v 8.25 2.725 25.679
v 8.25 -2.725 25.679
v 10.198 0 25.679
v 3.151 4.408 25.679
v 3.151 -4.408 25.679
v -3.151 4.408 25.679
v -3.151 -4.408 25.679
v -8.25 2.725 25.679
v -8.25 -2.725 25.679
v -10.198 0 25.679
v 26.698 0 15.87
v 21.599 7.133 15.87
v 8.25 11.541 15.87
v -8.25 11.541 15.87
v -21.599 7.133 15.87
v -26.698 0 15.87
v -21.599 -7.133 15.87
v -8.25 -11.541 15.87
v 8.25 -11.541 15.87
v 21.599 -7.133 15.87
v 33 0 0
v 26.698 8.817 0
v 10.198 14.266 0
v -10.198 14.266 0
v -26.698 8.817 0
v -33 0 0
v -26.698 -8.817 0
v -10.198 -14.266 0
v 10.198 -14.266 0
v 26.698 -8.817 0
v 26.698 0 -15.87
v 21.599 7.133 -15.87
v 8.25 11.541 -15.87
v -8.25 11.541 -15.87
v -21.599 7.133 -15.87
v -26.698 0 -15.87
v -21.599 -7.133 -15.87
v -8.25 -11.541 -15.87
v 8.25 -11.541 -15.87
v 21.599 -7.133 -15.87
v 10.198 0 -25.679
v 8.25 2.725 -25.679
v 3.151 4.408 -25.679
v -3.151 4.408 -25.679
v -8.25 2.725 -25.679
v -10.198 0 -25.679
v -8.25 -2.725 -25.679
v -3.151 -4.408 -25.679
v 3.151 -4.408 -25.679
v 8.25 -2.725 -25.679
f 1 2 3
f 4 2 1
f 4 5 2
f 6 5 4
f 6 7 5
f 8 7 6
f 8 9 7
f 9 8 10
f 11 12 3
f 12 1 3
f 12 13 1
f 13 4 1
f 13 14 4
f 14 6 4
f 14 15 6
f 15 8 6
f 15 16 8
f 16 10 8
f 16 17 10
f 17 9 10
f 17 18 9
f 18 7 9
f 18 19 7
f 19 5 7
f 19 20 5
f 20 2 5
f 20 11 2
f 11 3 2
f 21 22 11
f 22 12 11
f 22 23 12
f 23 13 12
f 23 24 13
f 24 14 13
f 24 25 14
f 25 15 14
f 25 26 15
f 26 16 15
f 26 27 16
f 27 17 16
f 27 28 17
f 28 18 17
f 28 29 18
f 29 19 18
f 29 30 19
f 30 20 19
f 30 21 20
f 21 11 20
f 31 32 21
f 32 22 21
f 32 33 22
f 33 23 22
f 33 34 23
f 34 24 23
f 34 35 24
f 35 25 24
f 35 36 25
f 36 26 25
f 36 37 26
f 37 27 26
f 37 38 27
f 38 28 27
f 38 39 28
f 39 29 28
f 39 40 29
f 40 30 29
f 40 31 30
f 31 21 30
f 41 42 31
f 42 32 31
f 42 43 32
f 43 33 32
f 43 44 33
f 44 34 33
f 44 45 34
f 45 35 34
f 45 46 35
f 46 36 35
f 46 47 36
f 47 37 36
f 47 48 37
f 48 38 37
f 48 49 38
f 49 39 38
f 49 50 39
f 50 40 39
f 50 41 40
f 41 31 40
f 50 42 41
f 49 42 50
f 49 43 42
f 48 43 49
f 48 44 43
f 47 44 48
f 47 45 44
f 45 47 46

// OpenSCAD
// Generated by SolidPython 1.0.1 on 2020-07-29 00:46:49


scale(v = [11, 5, 9]) {
	sphere(r = 3);
}
/***********************************************
*********      SolidPython code:      **********
************************************************
 
# import packages: SolidPython
from solid import *
from solid.utils import *
from itertools import chain, combinations, permutations


class Resize:

    def __init__(self, scad_file):
        self.scad_file = scad_file
        #self.scad_file = import_scad(scad_file)
        # cone/cylinder param:
        self.r1 = 0
        self.r2 = 0
        self.h = 0
        # rectangular prism param:
        self.w = 0
        self.l = 0
        # ellipse param:
        self.r = 0

    # import OpenScad code (file name corresponds to shape)


    # classify shape + parameters
    def assign(self, param1, param2, param3):
        if self.scad_file == 'cone.scad':
            self.r1 = param1
            self.r2 = param2
            self.h = param3
        elif self.scad_file == 'cylinder.scad':
            self.r1 = param1
            self.r2 = param2
            self.h = param3
        elif self.scad_file == 'rectangularPrism.scad':
            self.h = param1
            self.l = param2
            self.w = param3
        else:
            self.r = param1
            self.h = param2

    # resize parameters
    def iterate(self):
        x = range(3, 20, 2)
        i = 1
        if self.scad_file == 'cone.scad':
            tempList = list(permutations(x, 2))
            for temp in tempList:
                param1 = temp[0]
                param2 = temp[1]
                filepath = 'produced_scad_files/' + 'cone' + str(param1) + '_' + str(param2) + '_' + '.scad'
                scad_render_to_file(cylinder(h=param1, r1=param2, r2=0), filepath)

        elif self.scad_file == 'cylinder.scad':
            tempList = list(permutations(x, 3))
            for temp in tempList:
                param1 = temp[0]
                param2 = temp[1]
                filepath = 'produced_scad_files/' + 'cylinder' + str(param1) + '_' + str(param2) + '_' + '.scad'
                scad_render_to_file(cylinder(h=param1, r1=param2, r2=param2), filepath)

        elif self.scad_file == 'rectangularPrism.scad':
            tempList = list(permutations(x, 3))
            for temp in tempList:
                param1 = temp[0]
                param2 = temp[1]
                param3 = temp[2]
                filepath = 'produced_scad_files/' + 'rectangularPrism' + str(param1) + '_' + str(param2) + '_' + str(
                    param3) + '.scad'
                scad_render_to_file(cube(size=(param1, param2, param3)), filepath)

        elif self.scad_file == 'ellipse.scad':
            tempList = list(permutations(x, 4))
            for temp in tempList:
                param1 = temp[0]
                param2 = temp[1]
                param3 = temp[2]
                param4 = temp[3]
                filepath = 'produced_scad_files/' + 'ellipse' + str(param1) + '_' + str(param2) + '_' + str(param3) + '_' + str(param4) + '.scad'
                scad_render_to_file(scale([param1, param2, param3])(sphere(r=param4)), filepath)

    def render_to_scadfile(self):
        scad_render_to_file(scad, 'example.scad') 
 
************************************************/
